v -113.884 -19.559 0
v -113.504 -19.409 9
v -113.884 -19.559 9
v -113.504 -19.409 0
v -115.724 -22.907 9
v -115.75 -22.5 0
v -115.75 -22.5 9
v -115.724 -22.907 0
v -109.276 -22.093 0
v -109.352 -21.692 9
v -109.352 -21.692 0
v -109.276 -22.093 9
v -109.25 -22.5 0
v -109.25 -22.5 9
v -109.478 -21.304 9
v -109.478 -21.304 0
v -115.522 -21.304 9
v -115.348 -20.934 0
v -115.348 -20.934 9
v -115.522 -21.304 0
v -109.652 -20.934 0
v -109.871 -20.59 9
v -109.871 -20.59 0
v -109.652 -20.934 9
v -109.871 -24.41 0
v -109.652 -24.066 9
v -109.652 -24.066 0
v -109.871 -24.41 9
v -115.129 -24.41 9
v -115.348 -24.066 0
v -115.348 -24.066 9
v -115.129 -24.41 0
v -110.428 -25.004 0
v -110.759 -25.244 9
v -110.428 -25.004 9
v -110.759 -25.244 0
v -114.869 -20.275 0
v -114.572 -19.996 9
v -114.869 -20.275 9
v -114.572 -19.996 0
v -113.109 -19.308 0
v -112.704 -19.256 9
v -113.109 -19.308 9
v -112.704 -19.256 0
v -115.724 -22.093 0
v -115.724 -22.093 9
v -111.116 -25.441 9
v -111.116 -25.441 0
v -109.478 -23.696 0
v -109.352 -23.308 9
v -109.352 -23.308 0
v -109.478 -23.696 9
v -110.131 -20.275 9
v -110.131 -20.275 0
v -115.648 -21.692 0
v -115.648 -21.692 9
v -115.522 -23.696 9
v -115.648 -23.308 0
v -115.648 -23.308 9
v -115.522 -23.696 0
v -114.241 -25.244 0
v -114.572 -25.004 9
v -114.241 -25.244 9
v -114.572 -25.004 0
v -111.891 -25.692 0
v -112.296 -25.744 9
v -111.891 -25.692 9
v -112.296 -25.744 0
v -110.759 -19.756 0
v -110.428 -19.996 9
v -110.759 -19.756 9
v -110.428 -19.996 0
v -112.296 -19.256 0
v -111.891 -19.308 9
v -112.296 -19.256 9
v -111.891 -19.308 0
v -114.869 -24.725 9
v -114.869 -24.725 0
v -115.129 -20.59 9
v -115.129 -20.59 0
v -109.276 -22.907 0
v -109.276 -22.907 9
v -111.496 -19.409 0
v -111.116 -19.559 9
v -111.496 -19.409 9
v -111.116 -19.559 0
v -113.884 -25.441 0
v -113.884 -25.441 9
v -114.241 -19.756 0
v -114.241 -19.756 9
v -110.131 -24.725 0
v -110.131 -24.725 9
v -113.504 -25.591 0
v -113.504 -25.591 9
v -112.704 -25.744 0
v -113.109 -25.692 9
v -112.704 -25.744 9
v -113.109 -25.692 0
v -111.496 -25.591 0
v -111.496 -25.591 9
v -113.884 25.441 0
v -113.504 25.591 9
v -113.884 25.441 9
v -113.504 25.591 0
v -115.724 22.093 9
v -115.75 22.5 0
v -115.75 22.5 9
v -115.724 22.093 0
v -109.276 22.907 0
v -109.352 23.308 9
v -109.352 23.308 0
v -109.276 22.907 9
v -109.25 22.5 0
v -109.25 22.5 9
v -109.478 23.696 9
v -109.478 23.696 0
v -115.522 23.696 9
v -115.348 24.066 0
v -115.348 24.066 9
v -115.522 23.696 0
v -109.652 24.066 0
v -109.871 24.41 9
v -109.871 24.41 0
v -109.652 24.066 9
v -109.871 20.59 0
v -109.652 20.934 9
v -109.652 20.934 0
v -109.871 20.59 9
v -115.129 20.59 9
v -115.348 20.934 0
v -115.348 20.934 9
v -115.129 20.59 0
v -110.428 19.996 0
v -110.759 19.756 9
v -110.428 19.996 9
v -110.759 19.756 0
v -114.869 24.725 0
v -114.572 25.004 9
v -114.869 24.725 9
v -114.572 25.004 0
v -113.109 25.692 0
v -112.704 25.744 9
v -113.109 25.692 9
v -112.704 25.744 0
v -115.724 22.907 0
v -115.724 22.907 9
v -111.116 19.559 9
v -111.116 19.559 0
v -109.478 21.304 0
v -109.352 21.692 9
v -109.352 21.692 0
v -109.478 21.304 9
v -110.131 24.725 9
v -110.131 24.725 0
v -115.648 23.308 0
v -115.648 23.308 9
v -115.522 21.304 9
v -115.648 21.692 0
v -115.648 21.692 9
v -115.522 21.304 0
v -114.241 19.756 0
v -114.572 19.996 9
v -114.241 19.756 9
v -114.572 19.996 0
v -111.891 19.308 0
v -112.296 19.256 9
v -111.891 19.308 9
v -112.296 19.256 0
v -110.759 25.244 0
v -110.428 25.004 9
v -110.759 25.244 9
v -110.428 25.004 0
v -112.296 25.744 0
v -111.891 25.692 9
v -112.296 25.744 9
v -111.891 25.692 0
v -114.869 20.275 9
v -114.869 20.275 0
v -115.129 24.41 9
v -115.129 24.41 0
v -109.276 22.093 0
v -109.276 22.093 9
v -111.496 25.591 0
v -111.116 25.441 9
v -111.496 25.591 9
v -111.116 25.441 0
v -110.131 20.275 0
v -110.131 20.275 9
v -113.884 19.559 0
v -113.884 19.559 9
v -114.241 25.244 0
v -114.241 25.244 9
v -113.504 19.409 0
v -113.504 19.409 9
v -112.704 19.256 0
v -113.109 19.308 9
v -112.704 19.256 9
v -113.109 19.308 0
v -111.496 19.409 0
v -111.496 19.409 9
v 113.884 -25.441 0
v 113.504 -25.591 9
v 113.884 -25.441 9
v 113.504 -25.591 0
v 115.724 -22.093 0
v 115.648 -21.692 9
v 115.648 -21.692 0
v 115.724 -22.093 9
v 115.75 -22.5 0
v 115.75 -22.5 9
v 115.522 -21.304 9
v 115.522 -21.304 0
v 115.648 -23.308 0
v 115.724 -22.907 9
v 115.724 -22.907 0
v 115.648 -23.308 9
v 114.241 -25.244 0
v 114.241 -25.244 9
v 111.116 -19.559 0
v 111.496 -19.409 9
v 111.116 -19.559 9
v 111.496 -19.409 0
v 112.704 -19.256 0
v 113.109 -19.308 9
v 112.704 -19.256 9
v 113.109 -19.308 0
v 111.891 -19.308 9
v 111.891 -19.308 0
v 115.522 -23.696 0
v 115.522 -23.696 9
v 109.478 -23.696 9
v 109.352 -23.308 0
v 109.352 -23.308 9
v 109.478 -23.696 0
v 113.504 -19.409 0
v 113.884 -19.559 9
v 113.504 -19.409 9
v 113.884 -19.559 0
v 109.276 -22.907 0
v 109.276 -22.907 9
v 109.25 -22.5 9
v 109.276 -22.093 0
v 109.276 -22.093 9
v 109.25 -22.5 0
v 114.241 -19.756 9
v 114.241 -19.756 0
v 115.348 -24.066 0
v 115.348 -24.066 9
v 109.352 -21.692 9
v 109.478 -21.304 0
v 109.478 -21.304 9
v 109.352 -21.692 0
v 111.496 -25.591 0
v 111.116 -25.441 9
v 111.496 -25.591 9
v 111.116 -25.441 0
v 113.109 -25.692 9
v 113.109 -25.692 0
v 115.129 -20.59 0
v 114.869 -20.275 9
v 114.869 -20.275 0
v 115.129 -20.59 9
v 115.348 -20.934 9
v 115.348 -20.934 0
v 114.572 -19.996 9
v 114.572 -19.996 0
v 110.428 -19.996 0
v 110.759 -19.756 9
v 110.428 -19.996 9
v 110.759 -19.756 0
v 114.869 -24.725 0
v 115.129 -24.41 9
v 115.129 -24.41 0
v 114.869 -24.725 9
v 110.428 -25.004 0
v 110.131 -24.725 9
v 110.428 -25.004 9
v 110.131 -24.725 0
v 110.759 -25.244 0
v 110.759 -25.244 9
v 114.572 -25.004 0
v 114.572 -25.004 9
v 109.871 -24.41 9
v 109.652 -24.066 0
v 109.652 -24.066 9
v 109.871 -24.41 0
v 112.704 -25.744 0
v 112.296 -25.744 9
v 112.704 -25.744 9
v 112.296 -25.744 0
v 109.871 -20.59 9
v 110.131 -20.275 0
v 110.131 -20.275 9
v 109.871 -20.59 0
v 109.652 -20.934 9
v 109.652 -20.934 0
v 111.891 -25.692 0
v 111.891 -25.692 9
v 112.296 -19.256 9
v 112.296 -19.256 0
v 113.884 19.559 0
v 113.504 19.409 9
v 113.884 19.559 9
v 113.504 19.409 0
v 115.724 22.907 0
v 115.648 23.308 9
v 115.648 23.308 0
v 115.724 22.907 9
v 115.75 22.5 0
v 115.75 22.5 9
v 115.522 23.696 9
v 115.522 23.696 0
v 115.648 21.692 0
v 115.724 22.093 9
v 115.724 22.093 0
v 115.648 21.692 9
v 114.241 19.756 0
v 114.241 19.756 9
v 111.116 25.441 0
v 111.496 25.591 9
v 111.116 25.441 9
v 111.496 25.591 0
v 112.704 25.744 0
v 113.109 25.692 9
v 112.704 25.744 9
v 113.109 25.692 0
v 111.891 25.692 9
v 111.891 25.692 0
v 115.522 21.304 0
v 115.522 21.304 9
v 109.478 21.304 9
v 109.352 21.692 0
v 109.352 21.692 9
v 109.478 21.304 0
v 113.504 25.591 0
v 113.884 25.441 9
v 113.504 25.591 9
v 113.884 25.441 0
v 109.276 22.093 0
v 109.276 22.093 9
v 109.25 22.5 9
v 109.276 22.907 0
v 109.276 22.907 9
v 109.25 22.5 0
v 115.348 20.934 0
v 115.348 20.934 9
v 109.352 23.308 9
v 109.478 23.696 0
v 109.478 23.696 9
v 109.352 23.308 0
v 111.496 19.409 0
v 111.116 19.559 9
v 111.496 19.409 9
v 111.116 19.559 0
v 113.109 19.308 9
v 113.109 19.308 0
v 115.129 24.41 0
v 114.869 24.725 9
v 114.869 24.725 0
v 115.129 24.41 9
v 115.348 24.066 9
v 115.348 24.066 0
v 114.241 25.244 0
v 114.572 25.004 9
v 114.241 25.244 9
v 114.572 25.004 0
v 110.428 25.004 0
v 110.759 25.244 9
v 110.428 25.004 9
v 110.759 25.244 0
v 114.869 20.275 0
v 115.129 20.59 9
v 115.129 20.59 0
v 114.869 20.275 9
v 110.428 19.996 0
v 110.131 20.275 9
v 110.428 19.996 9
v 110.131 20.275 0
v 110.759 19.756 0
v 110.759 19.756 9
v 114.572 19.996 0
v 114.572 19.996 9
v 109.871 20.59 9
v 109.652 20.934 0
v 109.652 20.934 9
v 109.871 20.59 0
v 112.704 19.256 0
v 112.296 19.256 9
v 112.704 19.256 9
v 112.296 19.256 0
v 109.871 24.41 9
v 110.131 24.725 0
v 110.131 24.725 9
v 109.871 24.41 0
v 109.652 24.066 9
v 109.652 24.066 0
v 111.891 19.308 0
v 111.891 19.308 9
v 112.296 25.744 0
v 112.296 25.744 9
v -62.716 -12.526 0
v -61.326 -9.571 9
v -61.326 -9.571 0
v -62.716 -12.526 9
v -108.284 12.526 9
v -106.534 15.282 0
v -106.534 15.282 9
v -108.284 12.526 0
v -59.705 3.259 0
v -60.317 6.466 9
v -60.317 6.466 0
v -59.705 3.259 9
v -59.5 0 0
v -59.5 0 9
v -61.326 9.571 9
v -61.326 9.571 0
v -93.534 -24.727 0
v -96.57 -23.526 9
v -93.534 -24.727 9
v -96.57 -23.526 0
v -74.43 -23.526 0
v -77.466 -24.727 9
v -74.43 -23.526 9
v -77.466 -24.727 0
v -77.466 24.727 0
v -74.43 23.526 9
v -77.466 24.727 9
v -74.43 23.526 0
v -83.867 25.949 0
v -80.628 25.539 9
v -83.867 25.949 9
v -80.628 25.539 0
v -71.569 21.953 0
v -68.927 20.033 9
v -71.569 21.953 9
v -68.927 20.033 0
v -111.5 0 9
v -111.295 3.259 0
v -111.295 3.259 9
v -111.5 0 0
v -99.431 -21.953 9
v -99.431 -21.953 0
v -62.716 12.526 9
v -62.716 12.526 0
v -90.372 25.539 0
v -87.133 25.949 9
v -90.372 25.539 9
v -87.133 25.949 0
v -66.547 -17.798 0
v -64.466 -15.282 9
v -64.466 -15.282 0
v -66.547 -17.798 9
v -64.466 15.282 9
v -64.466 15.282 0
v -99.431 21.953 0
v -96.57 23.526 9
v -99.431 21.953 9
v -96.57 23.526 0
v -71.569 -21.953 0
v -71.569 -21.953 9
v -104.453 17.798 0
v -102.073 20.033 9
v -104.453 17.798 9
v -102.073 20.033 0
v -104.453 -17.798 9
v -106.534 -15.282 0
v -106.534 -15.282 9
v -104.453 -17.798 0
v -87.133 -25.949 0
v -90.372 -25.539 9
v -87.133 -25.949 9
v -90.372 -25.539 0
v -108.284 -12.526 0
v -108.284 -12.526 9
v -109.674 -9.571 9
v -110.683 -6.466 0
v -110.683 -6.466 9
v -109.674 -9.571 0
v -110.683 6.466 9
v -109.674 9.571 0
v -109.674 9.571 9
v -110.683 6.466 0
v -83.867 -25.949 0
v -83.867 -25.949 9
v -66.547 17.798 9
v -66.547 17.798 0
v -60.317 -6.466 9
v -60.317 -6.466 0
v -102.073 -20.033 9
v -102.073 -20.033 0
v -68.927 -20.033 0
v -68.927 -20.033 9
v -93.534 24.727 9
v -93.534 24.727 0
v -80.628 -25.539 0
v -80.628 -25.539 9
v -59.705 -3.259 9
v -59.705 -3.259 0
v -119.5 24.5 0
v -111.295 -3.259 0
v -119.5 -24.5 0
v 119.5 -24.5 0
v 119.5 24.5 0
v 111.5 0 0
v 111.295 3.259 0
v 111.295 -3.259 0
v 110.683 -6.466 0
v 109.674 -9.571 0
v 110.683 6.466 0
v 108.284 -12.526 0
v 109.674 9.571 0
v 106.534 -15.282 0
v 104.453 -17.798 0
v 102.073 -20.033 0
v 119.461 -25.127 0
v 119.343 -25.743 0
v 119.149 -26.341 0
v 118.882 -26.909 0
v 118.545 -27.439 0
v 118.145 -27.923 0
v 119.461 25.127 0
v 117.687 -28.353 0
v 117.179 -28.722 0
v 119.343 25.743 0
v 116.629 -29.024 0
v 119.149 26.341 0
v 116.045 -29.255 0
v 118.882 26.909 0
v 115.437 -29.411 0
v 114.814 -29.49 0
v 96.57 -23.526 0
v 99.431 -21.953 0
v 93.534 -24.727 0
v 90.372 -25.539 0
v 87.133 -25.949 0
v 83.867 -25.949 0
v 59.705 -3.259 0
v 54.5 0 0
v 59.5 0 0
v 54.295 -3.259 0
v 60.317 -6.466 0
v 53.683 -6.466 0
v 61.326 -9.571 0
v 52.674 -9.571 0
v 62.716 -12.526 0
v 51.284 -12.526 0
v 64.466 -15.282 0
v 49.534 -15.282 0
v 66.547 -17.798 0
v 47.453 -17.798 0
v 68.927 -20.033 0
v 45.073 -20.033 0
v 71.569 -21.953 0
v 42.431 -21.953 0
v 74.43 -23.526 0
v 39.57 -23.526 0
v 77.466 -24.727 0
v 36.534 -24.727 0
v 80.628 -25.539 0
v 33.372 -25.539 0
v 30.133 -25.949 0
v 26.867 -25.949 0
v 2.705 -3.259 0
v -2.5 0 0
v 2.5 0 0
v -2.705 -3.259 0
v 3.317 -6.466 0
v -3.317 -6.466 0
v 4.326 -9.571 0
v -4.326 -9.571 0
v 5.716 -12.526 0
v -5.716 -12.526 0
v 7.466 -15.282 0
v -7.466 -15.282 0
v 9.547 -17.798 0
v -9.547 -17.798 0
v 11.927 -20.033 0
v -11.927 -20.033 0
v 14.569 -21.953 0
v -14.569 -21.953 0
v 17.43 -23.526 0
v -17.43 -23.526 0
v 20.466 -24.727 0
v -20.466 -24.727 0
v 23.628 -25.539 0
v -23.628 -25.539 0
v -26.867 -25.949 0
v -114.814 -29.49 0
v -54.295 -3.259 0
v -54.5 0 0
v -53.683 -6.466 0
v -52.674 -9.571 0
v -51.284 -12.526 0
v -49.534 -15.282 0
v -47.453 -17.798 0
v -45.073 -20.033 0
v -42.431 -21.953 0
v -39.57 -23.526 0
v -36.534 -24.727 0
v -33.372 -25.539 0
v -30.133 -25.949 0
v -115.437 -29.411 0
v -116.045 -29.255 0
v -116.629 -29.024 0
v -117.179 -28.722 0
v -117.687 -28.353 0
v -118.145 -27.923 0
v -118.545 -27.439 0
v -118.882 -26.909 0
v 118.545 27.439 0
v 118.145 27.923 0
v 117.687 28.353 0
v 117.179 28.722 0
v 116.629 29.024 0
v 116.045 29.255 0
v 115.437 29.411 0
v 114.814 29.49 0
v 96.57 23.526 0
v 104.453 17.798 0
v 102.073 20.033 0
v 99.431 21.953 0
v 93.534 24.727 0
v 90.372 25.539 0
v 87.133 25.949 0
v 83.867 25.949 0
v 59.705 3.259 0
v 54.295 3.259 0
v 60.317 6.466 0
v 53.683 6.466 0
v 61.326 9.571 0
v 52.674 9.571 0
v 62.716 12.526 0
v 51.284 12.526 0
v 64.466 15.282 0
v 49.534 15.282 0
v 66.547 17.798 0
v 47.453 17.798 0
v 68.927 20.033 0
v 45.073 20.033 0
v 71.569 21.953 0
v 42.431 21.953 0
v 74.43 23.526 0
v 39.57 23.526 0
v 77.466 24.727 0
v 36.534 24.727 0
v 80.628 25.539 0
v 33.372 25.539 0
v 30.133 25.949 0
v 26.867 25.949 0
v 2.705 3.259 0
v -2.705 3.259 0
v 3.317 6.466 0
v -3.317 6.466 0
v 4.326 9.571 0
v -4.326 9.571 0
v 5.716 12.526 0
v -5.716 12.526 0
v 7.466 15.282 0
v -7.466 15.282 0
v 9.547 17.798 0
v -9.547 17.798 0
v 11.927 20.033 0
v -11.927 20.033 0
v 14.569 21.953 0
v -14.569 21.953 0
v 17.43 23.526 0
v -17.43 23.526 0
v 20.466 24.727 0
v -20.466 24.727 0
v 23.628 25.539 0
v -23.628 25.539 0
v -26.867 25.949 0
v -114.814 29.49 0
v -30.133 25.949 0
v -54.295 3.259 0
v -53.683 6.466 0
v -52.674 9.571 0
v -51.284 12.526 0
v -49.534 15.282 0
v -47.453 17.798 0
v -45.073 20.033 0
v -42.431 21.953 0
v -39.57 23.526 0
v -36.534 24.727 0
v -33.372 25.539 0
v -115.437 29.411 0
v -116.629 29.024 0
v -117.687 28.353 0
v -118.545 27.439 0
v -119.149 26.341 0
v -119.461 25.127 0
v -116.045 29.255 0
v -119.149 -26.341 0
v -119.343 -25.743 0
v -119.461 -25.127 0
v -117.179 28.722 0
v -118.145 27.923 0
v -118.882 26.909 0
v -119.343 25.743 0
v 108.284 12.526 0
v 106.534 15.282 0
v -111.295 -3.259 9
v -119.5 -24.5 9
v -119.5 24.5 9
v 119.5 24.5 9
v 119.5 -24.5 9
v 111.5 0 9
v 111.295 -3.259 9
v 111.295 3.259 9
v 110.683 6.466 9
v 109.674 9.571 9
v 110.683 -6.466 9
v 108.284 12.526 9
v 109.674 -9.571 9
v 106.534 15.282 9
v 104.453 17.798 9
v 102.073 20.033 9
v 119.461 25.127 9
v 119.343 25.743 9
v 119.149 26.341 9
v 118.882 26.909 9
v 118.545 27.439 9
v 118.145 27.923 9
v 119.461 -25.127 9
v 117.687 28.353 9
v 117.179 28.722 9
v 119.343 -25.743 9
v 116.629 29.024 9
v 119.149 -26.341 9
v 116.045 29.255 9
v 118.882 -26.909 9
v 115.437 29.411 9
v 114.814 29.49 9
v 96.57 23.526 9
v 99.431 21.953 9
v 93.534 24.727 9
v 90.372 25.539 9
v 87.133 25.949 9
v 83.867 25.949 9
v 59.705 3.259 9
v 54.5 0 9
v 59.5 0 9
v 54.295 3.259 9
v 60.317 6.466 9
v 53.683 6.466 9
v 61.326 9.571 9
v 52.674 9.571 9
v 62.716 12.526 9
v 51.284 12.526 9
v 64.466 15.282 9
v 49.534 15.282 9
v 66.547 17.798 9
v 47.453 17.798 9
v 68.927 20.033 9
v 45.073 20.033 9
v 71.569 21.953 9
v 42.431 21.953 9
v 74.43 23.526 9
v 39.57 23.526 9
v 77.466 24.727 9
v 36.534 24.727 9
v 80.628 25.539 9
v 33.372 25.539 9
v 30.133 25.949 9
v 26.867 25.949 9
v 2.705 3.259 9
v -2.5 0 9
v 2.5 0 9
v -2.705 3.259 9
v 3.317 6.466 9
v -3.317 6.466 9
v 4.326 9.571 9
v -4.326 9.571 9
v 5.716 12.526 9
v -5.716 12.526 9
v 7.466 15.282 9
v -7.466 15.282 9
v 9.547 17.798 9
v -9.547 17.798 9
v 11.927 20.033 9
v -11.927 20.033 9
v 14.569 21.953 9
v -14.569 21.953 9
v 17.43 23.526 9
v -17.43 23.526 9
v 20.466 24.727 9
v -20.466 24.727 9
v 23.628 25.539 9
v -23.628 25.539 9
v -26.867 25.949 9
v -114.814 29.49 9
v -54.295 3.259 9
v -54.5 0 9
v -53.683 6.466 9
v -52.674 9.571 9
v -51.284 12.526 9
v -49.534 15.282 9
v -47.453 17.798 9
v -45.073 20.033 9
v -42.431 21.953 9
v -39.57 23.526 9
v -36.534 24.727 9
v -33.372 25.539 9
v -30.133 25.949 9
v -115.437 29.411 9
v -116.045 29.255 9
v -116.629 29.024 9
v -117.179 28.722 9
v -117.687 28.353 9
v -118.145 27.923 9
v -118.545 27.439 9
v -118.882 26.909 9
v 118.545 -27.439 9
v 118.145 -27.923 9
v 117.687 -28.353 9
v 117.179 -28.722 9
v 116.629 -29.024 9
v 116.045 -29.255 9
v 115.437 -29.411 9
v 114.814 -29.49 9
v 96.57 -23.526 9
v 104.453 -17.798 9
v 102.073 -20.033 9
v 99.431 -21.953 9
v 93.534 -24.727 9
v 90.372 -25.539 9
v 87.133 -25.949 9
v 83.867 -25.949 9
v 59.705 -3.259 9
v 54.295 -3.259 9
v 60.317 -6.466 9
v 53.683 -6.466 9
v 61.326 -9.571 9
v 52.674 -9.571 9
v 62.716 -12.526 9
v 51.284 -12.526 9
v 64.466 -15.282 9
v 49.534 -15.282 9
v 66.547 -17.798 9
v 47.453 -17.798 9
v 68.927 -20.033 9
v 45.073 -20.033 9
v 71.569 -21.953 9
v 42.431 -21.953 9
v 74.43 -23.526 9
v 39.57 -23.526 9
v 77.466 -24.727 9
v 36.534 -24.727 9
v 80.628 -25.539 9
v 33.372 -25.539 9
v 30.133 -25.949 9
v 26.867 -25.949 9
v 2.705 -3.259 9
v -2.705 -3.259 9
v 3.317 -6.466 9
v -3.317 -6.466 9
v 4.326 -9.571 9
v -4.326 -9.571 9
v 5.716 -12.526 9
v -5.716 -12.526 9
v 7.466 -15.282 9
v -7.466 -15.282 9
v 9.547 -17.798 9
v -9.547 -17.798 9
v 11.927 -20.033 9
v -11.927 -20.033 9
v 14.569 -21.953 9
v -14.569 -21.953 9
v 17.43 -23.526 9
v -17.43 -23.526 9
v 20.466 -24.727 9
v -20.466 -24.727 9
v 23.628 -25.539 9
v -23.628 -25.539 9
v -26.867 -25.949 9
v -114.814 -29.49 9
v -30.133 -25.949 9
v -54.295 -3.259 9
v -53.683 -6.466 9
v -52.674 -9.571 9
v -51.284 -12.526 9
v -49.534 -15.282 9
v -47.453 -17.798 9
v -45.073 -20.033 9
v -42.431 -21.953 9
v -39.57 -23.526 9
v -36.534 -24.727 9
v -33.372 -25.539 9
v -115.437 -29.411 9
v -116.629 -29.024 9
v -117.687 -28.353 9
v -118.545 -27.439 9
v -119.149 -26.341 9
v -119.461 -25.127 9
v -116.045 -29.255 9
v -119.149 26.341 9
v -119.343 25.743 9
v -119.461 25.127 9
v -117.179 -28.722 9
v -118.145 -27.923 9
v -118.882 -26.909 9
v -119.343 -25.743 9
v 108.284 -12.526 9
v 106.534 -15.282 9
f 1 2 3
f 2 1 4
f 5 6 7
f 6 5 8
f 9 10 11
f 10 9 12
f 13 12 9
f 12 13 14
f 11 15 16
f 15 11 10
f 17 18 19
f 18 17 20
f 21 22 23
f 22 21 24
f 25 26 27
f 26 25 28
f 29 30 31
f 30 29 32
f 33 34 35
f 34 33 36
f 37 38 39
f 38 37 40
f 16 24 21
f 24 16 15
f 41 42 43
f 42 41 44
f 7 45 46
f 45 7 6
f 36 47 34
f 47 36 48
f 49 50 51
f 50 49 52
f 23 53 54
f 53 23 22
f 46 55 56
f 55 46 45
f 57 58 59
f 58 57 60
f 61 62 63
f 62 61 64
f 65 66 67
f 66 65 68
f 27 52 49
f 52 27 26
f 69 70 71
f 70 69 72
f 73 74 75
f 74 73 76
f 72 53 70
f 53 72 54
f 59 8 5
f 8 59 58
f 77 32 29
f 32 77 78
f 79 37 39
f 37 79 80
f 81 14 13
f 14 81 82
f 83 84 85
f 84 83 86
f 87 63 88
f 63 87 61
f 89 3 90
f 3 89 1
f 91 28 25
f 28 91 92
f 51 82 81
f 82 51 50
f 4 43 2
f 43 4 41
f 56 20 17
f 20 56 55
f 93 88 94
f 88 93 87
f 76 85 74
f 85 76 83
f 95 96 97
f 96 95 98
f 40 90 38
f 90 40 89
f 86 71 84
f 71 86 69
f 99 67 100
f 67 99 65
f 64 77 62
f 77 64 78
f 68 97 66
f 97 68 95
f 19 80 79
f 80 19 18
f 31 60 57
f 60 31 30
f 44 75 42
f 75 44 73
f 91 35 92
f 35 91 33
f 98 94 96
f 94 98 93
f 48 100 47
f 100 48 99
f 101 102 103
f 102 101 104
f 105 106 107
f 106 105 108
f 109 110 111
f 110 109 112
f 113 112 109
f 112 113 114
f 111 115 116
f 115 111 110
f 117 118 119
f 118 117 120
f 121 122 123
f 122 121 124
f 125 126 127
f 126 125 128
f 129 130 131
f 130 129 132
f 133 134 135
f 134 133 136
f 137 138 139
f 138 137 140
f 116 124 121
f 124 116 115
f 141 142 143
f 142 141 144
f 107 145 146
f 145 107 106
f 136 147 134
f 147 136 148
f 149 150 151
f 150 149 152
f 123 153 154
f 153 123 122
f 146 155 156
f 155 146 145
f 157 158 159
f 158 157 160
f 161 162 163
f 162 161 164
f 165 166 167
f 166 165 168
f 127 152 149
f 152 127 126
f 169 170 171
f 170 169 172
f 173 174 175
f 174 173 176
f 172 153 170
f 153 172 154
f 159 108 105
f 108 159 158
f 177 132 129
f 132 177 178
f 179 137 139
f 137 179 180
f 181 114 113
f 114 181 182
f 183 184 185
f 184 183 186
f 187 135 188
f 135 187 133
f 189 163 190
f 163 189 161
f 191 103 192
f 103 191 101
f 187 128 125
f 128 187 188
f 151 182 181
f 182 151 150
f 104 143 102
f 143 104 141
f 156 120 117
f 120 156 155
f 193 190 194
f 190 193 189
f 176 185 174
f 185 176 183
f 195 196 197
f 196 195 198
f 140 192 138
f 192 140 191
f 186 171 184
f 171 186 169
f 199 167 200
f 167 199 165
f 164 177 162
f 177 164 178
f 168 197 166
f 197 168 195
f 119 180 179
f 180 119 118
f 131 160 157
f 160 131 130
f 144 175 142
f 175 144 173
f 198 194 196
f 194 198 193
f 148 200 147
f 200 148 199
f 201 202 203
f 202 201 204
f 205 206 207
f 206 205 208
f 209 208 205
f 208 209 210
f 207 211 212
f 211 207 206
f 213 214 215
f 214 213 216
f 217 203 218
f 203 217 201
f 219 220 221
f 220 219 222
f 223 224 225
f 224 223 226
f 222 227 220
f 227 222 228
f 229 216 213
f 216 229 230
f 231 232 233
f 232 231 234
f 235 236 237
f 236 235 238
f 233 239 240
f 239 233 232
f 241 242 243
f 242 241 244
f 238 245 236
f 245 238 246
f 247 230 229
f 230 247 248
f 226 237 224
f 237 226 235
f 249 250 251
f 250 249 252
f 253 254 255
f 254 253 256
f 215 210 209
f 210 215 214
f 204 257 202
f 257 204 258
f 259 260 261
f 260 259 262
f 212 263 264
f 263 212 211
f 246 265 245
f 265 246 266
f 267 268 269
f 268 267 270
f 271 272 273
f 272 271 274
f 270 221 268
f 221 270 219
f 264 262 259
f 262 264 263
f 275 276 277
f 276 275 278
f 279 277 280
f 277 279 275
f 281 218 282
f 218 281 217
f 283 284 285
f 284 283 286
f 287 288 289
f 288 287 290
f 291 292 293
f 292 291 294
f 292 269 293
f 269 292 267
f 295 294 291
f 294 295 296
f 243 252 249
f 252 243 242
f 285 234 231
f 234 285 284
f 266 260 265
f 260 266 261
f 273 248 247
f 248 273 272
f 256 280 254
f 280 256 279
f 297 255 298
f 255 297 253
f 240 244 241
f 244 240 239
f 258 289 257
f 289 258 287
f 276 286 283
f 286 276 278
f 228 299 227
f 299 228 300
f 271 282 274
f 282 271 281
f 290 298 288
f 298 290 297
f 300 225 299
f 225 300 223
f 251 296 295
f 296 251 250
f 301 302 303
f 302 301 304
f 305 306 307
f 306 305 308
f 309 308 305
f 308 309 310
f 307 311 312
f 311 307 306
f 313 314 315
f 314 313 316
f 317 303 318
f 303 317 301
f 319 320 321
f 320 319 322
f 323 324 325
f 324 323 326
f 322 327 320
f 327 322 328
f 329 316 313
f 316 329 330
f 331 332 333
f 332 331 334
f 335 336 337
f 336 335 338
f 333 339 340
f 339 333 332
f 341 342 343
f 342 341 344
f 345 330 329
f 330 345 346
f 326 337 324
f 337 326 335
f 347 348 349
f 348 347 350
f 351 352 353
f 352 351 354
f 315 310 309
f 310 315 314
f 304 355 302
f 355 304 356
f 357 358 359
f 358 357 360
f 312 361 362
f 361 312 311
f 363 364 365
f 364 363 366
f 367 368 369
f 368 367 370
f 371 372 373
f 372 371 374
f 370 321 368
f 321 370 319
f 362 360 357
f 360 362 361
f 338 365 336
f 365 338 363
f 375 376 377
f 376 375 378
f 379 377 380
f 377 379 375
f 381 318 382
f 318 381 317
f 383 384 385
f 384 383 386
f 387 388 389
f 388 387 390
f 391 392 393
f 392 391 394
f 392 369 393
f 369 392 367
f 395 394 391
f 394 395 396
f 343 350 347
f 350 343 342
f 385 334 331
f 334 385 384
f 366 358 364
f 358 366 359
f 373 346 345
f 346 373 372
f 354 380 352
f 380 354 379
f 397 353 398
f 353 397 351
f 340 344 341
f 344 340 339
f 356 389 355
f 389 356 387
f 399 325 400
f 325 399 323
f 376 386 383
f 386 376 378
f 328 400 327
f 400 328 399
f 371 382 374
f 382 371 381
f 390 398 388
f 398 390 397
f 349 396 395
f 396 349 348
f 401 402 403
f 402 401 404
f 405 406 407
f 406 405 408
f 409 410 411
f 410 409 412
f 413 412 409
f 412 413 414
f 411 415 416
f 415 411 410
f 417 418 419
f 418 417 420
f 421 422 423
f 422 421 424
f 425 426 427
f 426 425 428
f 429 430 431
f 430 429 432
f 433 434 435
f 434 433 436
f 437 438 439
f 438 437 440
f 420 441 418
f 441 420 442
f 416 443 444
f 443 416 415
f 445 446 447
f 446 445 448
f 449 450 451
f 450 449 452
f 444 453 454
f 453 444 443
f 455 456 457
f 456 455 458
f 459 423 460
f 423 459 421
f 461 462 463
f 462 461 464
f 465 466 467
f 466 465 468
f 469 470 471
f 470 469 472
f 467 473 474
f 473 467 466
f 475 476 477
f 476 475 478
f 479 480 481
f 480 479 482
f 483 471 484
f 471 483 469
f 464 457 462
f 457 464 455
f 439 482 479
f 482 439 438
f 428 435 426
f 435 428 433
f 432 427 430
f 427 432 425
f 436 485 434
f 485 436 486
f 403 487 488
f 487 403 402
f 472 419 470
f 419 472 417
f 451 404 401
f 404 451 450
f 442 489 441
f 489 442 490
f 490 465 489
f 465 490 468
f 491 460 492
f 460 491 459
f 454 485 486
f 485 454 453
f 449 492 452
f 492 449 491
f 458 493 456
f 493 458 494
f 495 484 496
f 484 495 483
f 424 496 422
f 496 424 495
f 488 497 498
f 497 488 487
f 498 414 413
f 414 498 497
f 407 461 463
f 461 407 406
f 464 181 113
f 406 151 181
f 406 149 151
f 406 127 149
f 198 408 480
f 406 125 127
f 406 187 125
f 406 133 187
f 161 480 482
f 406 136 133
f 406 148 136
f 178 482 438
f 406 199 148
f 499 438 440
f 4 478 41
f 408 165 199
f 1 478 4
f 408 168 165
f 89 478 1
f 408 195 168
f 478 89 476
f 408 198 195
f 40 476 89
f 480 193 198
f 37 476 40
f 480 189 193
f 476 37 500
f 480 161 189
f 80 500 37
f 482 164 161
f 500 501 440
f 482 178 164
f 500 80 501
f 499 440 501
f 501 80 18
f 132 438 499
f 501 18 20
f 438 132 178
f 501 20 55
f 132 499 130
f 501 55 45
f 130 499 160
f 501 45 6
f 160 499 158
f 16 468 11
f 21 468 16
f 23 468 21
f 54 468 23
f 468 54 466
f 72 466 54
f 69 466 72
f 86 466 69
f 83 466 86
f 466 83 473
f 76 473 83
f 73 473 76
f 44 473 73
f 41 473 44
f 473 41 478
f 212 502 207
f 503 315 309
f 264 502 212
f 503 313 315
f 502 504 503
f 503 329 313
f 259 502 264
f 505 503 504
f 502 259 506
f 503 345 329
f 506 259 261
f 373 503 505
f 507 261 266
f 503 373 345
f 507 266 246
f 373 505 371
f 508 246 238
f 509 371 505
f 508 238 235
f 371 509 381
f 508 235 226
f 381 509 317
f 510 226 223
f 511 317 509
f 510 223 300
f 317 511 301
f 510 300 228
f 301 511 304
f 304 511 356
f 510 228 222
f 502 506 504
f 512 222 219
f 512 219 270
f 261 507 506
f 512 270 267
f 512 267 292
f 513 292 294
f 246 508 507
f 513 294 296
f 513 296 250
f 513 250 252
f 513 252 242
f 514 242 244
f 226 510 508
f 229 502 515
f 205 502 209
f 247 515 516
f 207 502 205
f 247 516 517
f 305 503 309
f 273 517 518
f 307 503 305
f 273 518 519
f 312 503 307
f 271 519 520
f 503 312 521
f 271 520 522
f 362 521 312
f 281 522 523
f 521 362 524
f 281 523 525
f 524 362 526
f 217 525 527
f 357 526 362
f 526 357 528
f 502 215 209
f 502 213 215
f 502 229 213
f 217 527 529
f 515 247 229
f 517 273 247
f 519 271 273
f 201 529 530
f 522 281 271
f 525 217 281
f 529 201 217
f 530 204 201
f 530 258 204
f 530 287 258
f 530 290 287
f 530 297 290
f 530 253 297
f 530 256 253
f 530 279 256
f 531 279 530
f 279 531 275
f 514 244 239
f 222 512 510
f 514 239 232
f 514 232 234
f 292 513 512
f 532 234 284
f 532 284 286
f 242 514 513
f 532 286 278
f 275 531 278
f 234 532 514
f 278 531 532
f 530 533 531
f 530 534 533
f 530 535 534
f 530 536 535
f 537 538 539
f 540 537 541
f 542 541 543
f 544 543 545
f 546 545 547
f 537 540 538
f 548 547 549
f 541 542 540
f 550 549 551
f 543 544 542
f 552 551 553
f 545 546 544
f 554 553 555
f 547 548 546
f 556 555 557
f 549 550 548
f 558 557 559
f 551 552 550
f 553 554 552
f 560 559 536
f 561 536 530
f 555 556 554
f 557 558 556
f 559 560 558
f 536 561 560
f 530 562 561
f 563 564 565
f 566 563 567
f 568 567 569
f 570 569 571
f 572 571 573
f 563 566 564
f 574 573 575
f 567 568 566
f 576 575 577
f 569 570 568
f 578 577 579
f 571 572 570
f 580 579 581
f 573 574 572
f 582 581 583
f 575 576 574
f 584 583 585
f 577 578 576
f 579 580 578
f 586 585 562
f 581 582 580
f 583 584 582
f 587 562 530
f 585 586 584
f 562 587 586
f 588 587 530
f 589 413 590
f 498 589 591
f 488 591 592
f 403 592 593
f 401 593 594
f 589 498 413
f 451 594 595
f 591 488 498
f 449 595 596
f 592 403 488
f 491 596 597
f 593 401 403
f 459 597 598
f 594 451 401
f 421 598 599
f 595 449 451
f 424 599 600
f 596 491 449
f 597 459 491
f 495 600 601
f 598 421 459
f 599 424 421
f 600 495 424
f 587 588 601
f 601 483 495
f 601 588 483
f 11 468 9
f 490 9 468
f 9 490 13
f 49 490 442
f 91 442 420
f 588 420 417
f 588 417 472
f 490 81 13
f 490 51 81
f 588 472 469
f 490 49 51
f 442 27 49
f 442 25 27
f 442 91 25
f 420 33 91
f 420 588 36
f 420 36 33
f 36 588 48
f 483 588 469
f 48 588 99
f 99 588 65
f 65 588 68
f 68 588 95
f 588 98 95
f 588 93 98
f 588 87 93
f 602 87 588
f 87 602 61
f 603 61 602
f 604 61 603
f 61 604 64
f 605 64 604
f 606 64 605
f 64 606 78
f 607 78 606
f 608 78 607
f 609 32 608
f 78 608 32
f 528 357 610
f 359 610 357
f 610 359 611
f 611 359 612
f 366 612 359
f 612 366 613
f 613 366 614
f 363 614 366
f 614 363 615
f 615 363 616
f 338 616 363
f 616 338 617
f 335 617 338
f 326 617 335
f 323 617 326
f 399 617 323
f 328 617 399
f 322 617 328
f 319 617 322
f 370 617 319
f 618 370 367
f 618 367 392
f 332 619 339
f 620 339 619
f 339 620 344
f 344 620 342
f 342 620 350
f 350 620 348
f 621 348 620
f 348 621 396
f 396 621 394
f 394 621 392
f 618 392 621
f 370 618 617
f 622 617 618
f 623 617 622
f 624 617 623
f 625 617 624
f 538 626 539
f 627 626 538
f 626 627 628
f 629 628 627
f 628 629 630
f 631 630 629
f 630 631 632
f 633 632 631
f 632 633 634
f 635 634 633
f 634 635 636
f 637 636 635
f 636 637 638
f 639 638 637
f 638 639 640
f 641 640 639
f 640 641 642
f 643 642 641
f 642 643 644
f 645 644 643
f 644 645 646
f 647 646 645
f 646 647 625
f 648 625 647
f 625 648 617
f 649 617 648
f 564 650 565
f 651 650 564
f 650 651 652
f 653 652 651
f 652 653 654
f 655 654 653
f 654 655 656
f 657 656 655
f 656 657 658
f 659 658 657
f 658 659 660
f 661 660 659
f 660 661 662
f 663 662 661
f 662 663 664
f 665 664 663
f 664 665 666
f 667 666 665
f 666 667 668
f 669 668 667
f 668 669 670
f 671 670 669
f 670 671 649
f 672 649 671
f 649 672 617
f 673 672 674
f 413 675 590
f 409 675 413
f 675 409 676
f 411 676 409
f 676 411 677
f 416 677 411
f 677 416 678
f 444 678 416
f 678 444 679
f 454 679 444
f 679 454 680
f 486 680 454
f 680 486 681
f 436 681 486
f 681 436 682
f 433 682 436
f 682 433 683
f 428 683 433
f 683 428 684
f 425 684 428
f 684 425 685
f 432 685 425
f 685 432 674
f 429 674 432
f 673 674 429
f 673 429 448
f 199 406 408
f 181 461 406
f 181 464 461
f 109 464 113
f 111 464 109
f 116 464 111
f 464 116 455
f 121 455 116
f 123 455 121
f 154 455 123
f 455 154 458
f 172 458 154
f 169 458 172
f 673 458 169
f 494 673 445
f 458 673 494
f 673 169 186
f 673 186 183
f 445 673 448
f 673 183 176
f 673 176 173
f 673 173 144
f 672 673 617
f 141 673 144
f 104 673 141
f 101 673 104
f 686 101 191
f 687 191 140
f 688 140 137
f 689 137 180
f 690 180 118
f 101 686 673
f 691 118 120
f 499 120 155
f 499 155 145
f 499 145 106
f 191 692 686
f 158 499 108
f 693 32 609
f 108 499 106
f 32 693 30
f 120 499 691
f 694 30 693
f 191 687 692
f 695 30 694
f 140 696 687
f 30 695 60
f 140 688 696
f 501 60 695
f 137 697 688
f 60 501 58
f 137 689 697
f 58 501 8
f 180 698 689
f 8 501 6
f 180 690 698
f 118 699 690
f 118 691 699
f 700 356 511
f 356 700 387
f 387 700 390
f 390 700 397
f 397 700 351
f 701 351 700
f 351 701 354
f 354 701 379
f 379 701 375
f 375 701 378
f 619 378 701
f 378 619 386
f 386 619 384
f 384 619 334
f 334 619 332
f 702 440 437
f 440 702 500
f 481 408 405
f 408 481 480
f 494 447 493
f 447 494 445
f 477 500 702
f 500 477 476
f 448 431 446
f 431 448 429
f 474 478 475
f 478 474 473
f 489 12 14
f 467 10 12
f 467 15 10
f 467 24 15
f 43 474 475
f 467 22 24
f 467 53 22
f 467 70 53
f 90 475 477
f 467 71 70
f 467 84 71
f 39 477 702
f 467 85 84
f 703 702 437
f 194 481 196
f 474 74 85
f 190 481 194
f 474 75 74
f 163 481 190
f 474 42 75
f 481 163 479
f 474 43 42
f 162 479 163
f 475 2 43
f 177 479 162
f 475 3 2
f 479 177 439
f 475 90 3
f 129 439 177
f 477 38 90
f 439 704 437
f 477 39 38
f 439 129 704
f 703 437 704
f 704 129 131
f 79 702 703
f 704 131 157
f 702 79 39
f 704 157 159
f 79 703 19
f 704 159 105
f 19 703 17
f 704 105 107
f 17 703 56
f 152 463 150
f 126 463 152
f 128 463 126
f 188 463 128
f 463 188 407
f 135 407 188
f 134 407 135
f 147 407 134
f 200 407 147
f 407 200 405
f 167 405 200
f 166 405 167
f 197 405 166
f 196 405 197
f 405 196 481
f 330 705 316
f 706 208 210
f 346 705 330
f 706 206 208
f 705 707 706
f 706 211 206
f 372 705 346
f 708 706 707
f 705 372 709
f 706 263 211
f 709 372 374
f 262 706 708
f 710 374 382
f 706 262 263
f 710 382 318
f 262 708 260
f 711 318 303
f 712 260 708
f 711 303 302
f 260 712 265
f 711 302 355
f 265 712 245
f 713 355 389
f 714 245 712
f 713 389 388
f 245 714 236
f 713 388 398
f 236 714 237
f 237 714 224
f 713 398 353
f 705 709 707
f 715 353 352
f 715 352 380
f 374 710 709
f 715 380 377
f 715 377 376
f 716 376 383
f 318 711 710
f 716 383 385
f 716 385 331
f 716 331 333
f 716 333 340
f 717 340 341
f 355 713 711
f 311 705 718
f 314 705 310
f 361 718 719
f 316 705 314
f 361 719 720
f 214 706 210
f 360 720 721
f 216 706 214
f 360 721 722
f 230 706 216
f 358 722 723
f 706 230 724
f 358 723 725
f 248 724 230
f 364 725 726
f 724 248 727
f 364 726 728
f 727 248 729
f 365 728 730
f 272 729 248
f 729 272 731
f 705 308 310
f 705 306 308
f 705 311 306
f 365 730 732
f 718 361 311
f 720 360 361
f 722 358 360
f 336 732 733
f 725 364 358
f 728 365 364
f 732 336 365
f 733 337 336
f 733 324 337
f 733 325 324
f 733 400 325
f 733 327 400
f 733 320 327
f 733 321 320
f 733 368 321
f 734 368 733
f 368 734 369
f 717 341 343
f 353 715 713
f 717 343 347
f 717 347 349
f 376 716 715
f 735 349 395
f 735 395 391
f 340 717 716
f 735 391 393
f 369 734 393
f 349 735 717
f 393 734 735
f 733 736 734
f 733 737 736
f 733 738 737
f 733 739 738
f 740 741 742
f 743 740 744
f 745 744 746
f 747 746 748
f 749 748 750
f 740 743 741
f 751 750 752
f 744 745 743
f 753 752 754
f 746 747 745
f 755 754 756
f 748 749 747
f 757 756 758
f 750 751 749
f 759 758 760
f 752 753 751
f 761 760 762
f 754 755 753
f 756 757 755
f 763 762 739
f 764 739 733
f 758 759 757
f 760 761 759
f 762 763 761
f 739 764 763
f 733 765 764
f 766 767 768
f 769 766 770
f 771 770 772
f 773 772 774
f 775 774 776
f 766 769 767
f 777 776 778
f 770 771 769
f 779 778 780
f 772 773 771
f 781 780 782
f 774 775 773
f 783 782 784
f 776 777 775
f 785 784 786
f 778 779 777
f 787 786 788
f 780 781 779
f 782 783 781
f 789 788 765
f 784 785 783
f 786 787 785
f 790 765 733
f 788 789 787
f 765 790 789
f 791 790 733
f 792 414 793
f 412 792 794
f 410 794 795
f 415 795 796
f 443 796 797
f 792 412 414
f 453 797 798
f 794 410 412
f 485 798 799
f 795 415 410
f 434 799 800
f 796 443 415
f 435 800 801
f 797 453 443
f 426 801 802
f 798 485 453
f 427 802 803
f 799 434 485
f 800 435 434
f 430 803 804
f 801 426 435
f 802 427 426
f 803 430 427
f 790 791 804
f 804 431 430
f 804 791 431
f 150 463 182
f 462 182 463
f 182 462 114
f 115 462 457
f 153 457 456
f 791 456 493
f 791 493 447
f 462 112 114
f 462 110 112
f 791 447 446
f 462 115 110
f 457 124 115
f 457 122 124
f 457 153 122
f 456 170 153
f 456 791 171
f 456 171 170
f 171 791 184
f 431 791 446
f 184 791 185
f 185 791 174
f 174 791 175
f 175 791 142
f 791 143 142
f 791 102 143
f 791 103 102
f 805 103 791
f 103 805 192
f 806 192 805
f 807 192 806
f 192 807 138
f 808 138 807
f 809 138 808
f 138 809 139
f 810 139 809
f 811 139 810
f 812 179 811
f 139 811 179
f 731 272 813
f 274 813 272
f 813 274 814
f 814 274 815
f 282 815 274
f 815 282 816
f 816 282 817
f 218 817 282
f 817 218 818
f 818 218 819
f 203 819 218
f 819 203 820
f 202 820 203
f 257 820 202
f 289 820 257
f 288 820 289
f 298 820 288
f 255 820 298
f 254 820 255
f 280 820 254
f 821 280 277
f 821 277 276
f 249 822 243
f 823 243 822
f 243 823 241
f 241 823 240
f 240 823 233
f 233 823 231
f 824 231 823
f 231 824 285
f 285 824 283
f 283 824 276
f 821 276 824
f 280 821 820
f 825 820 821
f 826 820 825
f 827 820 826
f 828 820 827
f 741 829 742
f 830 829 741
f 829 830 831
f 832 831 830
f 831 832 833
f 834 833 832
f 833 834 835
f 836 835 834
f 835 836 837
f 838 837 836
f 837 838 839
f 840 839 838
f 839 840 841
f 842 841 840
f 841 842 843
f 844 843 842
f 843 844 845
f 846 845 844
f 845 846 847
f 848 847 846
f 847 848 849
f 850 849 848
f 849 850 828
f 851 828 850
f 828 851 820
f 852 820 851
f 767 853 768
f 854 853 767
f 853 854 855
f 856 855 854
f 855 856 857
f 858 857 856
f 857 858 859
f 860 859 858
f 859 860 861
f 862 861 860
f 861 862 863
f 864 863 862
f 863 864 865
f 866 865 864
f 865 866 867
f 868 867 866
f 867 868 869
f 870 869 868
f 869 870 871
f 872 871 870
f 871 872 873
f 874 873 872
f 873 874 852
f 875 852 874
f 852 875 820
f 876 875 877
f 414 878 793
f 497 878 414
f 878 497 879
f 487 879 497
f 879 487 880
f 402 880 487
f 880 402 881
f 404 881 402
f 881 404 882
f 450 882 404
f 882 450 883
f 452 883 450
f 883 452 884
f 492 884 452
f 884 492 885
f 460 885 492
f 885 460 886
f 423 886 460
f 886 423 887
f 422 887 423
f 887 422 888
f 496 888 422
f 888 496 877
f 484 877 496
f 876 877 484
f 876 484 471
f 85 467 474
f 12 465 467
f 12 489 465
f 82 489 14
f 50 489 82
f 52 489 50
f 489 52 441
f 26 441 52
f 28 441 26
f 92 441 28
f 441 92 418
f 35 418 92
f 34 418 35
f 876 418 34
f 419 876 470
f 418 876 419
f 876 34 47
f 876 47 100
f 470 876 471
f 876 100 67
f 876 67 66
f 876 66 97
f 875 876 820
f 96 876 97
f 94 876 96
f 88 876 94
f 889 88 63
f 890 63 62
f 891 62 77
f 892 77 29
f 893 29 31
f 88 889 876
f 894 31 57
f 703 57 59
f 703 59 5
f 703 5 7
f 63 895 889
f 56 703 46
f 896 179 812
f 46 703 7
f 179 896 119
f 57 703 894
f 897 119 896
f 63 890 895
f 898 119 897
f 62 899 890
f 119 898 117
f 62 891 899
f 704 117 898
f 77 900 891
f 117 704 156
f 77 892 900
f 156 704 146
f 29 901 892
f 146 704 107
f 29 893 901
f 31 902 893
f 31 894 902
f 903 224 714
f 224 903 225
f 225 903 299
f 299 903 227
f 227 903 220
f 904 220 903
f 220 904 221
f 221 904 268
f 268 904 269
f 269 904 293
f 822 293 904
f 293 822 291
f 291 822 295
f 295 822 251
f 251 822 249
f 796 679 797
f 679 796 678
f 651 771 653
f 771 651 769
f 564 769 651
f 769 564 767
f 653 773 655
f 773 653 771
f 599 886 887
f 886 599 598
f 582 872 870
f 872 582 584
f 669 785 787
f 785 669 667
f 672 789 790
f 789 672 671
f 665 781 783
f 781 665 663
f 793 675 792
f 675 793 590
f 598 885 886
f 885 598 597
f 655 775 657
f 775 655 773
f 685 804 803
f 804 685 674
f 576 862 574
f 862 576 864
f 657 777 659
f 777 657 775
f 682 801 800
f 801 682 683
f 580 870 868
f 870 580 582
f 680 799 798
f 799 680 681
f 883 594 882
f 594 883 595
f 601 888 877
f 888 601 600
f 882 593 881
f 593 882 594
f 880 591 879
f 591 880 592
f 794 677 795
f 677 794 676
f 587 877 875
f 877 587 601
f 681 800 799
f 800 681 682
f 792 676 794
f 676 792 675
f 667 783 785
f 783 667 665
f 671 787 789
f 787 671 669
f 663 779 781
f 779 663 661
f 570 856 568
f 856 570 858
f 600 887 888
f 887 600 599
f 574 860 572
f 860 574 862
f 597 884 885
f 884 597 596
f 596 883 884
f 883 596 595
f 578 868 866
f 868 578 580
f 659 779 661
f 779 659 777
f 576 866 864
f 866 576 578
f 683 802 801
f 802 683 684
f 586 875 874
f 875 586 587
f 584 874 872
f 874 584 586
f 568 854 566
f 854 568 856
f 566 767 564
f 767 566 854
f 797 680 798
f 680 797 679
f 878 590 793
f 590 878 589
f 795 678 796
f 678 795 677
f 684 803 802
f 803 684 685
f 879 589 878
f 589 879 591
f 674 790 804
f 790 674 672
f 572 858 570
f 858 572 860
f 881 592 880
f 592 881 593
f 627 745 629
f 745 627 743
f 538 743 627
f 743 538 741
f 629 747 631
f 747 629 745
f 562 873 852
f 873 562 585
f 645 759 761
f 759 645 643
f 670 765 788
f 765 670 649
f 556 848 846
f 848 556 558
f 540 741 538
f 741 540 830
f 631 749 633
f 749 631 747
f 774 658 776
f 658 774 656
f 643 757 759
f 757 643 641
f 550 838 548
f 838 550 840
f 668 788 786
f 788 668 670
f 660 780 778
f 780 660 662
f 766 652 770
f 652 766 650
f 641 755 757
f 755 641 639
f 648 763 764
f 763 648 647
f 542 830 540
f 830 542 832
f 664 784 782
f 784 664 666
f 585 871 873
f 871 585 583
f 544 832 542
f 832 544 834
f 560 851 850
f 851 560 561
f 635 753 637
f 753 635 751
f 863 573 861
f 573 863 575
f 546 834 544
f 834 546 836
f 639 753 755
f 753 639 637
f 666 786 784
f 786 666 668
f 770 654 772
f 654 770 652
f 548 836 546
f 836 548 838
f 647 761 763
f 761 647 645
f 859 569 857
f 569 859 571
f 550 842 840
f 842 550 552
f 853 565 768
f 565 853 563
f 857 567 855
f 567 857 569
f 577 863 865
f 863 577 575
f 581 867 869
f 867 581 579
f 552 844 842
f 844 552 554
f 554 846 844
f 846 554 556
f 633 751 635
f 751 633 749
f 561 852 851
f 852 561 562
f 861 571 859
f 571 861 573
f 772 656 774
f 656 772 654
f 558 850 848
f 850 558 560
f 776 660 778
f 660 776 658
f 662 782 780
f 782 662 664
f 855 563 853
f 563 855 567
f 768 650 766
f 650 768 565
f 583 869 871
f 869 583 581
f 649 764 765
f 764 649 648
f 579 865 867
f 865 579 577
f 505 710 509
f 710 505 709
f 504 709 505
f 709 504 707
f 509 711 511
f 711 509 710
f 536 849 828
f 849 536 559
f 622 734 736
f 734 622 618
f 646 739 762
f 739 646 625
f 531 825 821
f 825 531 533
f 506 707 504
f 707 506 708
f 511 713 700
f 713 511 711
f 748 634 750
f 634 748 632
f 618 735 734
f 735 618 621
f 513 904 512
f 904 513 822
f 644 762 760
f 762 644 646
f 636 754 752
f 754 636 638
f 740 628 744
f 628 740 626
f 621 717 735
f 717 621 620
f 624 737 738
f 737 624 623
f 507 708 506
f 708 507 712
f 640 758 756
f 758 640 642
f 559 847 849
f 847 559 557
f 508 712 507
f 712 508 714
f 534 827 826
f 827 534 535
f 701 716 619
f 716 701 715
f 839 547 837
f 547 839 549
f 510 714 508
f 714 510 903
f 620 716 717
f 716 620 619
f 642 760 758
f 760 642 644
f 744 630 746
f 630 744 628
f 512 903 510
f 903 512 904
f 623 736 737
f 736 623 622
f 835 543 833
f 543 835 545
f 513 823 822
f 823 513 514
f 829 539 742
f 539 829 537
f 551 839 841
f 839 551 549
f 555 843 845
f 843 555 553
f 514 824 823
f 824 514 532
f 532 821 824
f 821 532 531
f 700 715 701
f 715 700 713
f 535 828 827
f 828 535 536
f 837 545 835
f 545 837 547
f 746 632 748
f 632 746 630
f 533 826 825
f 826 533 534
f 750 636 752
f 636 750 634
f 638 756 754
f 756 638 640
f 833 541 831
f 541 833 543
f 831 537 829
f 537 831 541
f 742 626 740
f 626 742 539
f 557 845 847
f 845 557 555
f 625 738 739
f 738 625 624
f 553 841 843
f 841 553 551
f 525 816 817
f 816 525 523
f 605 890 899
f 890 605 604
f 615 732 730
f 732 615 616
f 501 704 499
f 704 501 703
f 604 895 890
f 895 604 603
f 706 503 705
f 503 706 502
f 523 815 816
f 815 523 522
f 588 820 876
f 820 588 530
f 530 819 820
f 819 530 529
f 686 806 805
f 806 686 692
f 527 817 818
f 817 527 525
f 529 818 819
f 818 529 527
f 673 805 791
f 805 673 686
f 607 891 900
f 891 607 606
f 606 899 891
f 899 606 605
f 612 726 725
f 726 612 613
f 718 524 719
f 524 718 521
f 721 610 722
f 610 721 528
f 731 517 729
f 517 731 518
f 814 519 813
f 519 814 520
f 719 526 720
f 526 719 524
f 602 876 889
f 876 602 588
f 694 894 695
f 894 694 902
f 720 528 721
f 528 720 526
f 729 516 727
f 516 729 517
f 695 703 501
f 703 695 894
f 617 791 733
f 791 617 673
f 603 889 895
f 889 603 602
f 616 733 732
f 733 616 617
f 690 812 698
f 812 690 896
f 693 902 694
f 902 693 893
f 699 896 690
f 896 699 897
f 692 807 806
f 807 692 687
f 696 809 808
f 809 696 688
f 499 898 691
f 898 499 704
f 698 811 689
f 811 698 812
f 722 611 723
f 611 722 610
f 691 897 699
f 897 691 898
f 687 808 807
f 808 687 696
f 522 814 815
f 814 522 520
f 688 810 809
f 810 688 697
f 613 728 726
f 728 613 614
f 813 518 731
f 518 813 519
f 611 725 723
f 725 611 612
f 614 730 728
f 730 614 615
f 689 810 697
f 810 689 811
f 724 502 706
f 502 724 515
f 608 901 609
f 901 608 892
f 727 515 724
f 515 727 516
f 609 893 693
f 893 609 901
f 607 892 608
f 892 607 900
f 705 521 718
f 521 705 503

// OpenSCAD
$fn = 50;


difference() {
	union() {
		hull() {
			translate(v = [-114.5000000000, 24.5000000000, 0]) {
				cylinder(h = 9, r = 5);
			}
			translate(v = [114.5000000000, 24.5000000000, 0]) {
				cylinder(h = 9, r = 5);
			}
			translate(v = [-114.5000000000, -24.5000000000, 0]) {
				cylinder(h = 9, r = 5);
			}
			translate(v = [114.5000000000, -24.5000000000, 0]) {
				cylinder(h = 9, r = 5);
			}
		}
	}
	union() {
		#translate(v = [-112.5000000000, -22.5000000000, -100.0000000000]) {
			cylinder(h = 200, r = 3.2500000000);
		}
		#translate(v = [-112.5000000000, 22.5000000000, -100.0000000000]) {
			cylinder(h = 200, r = 3.2500000000);
		}
		#translate(v = [112.5000000000, -22.5000000000, -100.0000000000]) {
			cylinder(h = 200, r = 3.2500000000);
		}
		#translate(v = [112.5000000000, 22.5000000000, -100.0000000000]) {
			cylinder(h = 200, r = 3.2500000000);
		}
		#translate(v = [-85.5000000000, 0, 0]) {
			cylinder(h = 9, r = 26.0000000000);
		}
		#translate(v = [-28.5000000000, 0, 0]) {
			cylinder(h = 9, r = 26.0000000000);
		}
		#translate(v = [28.5000000000, 0, 0]) {
			cylinder(h = 9, r = 26.0000000000);
		}
		#translate(v = [85.5000000000, 0, 0]) {
			cylinder(h = 9, r = 26.0000000000);
		}
	}
}
